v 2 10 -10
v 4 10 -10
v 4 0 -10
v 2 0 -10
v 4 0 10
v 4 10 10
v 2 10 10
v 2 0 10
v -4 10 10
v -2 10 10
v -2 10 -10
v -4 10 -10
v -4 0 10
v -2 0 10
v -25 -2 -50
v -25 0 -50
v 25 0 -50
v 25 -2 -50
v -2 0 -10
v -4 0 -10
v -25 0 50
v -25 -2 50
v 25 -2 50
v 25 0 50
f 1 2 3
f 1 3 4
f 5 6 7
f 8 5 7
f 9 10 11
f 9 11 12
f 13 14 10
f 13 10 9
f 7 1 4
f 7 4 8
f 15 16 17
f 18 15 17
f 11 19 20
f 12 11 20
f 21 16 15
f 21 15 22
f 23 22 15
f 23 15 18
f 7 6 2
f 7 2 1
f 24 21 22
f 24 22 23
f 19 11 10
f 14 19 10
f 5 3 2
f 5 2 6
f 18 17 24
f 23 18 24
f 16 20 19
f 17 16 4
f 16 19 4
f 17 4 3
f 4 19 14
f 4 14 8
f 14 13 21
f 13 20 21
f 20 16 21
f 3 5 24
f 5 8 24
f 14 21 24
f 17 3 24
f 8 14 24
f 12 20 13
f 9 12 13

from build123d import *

# Parameters (mm, degrees)
F0_W     = 50
F0_H     = 100
F1_DEPTH = 2
F2_W     = 8
F2_H     = 20
F3_DEPTH = 10
F4_W     = 4
F4_H     = 36.223298
F5_DEPTH = 10


with BuildPart() as f1:
    # F0 (on Front) → F1 (new body)
    with BuildSketch(Plane.XZ):
        Rectangle(F0_W, F0_H)
    extrude(amount=F1_DEPTH)

    # F2 (on face) → F3 (join)
    with BuildSketch(Plane(origin=(0, 0, 0), x_dir=(-1, 0, 0), z_dir=(0, 1, 0))):
        Rectangle(F2_W, F2_H)
    extrude(amount=F3_DEPTH)

    # F4 (on face) → F5 (cut)
    with BuildSketch(Plane(origin=(0, 10, 0), x_dir=(-1, 0, 0), z_dir=(0, 1, 0))):
        Rectangle(F4_W, F4_H)
    extrude(amount=-F5_DEPTH, mode=Mode.SUBTRACT)


solid = f1.part
